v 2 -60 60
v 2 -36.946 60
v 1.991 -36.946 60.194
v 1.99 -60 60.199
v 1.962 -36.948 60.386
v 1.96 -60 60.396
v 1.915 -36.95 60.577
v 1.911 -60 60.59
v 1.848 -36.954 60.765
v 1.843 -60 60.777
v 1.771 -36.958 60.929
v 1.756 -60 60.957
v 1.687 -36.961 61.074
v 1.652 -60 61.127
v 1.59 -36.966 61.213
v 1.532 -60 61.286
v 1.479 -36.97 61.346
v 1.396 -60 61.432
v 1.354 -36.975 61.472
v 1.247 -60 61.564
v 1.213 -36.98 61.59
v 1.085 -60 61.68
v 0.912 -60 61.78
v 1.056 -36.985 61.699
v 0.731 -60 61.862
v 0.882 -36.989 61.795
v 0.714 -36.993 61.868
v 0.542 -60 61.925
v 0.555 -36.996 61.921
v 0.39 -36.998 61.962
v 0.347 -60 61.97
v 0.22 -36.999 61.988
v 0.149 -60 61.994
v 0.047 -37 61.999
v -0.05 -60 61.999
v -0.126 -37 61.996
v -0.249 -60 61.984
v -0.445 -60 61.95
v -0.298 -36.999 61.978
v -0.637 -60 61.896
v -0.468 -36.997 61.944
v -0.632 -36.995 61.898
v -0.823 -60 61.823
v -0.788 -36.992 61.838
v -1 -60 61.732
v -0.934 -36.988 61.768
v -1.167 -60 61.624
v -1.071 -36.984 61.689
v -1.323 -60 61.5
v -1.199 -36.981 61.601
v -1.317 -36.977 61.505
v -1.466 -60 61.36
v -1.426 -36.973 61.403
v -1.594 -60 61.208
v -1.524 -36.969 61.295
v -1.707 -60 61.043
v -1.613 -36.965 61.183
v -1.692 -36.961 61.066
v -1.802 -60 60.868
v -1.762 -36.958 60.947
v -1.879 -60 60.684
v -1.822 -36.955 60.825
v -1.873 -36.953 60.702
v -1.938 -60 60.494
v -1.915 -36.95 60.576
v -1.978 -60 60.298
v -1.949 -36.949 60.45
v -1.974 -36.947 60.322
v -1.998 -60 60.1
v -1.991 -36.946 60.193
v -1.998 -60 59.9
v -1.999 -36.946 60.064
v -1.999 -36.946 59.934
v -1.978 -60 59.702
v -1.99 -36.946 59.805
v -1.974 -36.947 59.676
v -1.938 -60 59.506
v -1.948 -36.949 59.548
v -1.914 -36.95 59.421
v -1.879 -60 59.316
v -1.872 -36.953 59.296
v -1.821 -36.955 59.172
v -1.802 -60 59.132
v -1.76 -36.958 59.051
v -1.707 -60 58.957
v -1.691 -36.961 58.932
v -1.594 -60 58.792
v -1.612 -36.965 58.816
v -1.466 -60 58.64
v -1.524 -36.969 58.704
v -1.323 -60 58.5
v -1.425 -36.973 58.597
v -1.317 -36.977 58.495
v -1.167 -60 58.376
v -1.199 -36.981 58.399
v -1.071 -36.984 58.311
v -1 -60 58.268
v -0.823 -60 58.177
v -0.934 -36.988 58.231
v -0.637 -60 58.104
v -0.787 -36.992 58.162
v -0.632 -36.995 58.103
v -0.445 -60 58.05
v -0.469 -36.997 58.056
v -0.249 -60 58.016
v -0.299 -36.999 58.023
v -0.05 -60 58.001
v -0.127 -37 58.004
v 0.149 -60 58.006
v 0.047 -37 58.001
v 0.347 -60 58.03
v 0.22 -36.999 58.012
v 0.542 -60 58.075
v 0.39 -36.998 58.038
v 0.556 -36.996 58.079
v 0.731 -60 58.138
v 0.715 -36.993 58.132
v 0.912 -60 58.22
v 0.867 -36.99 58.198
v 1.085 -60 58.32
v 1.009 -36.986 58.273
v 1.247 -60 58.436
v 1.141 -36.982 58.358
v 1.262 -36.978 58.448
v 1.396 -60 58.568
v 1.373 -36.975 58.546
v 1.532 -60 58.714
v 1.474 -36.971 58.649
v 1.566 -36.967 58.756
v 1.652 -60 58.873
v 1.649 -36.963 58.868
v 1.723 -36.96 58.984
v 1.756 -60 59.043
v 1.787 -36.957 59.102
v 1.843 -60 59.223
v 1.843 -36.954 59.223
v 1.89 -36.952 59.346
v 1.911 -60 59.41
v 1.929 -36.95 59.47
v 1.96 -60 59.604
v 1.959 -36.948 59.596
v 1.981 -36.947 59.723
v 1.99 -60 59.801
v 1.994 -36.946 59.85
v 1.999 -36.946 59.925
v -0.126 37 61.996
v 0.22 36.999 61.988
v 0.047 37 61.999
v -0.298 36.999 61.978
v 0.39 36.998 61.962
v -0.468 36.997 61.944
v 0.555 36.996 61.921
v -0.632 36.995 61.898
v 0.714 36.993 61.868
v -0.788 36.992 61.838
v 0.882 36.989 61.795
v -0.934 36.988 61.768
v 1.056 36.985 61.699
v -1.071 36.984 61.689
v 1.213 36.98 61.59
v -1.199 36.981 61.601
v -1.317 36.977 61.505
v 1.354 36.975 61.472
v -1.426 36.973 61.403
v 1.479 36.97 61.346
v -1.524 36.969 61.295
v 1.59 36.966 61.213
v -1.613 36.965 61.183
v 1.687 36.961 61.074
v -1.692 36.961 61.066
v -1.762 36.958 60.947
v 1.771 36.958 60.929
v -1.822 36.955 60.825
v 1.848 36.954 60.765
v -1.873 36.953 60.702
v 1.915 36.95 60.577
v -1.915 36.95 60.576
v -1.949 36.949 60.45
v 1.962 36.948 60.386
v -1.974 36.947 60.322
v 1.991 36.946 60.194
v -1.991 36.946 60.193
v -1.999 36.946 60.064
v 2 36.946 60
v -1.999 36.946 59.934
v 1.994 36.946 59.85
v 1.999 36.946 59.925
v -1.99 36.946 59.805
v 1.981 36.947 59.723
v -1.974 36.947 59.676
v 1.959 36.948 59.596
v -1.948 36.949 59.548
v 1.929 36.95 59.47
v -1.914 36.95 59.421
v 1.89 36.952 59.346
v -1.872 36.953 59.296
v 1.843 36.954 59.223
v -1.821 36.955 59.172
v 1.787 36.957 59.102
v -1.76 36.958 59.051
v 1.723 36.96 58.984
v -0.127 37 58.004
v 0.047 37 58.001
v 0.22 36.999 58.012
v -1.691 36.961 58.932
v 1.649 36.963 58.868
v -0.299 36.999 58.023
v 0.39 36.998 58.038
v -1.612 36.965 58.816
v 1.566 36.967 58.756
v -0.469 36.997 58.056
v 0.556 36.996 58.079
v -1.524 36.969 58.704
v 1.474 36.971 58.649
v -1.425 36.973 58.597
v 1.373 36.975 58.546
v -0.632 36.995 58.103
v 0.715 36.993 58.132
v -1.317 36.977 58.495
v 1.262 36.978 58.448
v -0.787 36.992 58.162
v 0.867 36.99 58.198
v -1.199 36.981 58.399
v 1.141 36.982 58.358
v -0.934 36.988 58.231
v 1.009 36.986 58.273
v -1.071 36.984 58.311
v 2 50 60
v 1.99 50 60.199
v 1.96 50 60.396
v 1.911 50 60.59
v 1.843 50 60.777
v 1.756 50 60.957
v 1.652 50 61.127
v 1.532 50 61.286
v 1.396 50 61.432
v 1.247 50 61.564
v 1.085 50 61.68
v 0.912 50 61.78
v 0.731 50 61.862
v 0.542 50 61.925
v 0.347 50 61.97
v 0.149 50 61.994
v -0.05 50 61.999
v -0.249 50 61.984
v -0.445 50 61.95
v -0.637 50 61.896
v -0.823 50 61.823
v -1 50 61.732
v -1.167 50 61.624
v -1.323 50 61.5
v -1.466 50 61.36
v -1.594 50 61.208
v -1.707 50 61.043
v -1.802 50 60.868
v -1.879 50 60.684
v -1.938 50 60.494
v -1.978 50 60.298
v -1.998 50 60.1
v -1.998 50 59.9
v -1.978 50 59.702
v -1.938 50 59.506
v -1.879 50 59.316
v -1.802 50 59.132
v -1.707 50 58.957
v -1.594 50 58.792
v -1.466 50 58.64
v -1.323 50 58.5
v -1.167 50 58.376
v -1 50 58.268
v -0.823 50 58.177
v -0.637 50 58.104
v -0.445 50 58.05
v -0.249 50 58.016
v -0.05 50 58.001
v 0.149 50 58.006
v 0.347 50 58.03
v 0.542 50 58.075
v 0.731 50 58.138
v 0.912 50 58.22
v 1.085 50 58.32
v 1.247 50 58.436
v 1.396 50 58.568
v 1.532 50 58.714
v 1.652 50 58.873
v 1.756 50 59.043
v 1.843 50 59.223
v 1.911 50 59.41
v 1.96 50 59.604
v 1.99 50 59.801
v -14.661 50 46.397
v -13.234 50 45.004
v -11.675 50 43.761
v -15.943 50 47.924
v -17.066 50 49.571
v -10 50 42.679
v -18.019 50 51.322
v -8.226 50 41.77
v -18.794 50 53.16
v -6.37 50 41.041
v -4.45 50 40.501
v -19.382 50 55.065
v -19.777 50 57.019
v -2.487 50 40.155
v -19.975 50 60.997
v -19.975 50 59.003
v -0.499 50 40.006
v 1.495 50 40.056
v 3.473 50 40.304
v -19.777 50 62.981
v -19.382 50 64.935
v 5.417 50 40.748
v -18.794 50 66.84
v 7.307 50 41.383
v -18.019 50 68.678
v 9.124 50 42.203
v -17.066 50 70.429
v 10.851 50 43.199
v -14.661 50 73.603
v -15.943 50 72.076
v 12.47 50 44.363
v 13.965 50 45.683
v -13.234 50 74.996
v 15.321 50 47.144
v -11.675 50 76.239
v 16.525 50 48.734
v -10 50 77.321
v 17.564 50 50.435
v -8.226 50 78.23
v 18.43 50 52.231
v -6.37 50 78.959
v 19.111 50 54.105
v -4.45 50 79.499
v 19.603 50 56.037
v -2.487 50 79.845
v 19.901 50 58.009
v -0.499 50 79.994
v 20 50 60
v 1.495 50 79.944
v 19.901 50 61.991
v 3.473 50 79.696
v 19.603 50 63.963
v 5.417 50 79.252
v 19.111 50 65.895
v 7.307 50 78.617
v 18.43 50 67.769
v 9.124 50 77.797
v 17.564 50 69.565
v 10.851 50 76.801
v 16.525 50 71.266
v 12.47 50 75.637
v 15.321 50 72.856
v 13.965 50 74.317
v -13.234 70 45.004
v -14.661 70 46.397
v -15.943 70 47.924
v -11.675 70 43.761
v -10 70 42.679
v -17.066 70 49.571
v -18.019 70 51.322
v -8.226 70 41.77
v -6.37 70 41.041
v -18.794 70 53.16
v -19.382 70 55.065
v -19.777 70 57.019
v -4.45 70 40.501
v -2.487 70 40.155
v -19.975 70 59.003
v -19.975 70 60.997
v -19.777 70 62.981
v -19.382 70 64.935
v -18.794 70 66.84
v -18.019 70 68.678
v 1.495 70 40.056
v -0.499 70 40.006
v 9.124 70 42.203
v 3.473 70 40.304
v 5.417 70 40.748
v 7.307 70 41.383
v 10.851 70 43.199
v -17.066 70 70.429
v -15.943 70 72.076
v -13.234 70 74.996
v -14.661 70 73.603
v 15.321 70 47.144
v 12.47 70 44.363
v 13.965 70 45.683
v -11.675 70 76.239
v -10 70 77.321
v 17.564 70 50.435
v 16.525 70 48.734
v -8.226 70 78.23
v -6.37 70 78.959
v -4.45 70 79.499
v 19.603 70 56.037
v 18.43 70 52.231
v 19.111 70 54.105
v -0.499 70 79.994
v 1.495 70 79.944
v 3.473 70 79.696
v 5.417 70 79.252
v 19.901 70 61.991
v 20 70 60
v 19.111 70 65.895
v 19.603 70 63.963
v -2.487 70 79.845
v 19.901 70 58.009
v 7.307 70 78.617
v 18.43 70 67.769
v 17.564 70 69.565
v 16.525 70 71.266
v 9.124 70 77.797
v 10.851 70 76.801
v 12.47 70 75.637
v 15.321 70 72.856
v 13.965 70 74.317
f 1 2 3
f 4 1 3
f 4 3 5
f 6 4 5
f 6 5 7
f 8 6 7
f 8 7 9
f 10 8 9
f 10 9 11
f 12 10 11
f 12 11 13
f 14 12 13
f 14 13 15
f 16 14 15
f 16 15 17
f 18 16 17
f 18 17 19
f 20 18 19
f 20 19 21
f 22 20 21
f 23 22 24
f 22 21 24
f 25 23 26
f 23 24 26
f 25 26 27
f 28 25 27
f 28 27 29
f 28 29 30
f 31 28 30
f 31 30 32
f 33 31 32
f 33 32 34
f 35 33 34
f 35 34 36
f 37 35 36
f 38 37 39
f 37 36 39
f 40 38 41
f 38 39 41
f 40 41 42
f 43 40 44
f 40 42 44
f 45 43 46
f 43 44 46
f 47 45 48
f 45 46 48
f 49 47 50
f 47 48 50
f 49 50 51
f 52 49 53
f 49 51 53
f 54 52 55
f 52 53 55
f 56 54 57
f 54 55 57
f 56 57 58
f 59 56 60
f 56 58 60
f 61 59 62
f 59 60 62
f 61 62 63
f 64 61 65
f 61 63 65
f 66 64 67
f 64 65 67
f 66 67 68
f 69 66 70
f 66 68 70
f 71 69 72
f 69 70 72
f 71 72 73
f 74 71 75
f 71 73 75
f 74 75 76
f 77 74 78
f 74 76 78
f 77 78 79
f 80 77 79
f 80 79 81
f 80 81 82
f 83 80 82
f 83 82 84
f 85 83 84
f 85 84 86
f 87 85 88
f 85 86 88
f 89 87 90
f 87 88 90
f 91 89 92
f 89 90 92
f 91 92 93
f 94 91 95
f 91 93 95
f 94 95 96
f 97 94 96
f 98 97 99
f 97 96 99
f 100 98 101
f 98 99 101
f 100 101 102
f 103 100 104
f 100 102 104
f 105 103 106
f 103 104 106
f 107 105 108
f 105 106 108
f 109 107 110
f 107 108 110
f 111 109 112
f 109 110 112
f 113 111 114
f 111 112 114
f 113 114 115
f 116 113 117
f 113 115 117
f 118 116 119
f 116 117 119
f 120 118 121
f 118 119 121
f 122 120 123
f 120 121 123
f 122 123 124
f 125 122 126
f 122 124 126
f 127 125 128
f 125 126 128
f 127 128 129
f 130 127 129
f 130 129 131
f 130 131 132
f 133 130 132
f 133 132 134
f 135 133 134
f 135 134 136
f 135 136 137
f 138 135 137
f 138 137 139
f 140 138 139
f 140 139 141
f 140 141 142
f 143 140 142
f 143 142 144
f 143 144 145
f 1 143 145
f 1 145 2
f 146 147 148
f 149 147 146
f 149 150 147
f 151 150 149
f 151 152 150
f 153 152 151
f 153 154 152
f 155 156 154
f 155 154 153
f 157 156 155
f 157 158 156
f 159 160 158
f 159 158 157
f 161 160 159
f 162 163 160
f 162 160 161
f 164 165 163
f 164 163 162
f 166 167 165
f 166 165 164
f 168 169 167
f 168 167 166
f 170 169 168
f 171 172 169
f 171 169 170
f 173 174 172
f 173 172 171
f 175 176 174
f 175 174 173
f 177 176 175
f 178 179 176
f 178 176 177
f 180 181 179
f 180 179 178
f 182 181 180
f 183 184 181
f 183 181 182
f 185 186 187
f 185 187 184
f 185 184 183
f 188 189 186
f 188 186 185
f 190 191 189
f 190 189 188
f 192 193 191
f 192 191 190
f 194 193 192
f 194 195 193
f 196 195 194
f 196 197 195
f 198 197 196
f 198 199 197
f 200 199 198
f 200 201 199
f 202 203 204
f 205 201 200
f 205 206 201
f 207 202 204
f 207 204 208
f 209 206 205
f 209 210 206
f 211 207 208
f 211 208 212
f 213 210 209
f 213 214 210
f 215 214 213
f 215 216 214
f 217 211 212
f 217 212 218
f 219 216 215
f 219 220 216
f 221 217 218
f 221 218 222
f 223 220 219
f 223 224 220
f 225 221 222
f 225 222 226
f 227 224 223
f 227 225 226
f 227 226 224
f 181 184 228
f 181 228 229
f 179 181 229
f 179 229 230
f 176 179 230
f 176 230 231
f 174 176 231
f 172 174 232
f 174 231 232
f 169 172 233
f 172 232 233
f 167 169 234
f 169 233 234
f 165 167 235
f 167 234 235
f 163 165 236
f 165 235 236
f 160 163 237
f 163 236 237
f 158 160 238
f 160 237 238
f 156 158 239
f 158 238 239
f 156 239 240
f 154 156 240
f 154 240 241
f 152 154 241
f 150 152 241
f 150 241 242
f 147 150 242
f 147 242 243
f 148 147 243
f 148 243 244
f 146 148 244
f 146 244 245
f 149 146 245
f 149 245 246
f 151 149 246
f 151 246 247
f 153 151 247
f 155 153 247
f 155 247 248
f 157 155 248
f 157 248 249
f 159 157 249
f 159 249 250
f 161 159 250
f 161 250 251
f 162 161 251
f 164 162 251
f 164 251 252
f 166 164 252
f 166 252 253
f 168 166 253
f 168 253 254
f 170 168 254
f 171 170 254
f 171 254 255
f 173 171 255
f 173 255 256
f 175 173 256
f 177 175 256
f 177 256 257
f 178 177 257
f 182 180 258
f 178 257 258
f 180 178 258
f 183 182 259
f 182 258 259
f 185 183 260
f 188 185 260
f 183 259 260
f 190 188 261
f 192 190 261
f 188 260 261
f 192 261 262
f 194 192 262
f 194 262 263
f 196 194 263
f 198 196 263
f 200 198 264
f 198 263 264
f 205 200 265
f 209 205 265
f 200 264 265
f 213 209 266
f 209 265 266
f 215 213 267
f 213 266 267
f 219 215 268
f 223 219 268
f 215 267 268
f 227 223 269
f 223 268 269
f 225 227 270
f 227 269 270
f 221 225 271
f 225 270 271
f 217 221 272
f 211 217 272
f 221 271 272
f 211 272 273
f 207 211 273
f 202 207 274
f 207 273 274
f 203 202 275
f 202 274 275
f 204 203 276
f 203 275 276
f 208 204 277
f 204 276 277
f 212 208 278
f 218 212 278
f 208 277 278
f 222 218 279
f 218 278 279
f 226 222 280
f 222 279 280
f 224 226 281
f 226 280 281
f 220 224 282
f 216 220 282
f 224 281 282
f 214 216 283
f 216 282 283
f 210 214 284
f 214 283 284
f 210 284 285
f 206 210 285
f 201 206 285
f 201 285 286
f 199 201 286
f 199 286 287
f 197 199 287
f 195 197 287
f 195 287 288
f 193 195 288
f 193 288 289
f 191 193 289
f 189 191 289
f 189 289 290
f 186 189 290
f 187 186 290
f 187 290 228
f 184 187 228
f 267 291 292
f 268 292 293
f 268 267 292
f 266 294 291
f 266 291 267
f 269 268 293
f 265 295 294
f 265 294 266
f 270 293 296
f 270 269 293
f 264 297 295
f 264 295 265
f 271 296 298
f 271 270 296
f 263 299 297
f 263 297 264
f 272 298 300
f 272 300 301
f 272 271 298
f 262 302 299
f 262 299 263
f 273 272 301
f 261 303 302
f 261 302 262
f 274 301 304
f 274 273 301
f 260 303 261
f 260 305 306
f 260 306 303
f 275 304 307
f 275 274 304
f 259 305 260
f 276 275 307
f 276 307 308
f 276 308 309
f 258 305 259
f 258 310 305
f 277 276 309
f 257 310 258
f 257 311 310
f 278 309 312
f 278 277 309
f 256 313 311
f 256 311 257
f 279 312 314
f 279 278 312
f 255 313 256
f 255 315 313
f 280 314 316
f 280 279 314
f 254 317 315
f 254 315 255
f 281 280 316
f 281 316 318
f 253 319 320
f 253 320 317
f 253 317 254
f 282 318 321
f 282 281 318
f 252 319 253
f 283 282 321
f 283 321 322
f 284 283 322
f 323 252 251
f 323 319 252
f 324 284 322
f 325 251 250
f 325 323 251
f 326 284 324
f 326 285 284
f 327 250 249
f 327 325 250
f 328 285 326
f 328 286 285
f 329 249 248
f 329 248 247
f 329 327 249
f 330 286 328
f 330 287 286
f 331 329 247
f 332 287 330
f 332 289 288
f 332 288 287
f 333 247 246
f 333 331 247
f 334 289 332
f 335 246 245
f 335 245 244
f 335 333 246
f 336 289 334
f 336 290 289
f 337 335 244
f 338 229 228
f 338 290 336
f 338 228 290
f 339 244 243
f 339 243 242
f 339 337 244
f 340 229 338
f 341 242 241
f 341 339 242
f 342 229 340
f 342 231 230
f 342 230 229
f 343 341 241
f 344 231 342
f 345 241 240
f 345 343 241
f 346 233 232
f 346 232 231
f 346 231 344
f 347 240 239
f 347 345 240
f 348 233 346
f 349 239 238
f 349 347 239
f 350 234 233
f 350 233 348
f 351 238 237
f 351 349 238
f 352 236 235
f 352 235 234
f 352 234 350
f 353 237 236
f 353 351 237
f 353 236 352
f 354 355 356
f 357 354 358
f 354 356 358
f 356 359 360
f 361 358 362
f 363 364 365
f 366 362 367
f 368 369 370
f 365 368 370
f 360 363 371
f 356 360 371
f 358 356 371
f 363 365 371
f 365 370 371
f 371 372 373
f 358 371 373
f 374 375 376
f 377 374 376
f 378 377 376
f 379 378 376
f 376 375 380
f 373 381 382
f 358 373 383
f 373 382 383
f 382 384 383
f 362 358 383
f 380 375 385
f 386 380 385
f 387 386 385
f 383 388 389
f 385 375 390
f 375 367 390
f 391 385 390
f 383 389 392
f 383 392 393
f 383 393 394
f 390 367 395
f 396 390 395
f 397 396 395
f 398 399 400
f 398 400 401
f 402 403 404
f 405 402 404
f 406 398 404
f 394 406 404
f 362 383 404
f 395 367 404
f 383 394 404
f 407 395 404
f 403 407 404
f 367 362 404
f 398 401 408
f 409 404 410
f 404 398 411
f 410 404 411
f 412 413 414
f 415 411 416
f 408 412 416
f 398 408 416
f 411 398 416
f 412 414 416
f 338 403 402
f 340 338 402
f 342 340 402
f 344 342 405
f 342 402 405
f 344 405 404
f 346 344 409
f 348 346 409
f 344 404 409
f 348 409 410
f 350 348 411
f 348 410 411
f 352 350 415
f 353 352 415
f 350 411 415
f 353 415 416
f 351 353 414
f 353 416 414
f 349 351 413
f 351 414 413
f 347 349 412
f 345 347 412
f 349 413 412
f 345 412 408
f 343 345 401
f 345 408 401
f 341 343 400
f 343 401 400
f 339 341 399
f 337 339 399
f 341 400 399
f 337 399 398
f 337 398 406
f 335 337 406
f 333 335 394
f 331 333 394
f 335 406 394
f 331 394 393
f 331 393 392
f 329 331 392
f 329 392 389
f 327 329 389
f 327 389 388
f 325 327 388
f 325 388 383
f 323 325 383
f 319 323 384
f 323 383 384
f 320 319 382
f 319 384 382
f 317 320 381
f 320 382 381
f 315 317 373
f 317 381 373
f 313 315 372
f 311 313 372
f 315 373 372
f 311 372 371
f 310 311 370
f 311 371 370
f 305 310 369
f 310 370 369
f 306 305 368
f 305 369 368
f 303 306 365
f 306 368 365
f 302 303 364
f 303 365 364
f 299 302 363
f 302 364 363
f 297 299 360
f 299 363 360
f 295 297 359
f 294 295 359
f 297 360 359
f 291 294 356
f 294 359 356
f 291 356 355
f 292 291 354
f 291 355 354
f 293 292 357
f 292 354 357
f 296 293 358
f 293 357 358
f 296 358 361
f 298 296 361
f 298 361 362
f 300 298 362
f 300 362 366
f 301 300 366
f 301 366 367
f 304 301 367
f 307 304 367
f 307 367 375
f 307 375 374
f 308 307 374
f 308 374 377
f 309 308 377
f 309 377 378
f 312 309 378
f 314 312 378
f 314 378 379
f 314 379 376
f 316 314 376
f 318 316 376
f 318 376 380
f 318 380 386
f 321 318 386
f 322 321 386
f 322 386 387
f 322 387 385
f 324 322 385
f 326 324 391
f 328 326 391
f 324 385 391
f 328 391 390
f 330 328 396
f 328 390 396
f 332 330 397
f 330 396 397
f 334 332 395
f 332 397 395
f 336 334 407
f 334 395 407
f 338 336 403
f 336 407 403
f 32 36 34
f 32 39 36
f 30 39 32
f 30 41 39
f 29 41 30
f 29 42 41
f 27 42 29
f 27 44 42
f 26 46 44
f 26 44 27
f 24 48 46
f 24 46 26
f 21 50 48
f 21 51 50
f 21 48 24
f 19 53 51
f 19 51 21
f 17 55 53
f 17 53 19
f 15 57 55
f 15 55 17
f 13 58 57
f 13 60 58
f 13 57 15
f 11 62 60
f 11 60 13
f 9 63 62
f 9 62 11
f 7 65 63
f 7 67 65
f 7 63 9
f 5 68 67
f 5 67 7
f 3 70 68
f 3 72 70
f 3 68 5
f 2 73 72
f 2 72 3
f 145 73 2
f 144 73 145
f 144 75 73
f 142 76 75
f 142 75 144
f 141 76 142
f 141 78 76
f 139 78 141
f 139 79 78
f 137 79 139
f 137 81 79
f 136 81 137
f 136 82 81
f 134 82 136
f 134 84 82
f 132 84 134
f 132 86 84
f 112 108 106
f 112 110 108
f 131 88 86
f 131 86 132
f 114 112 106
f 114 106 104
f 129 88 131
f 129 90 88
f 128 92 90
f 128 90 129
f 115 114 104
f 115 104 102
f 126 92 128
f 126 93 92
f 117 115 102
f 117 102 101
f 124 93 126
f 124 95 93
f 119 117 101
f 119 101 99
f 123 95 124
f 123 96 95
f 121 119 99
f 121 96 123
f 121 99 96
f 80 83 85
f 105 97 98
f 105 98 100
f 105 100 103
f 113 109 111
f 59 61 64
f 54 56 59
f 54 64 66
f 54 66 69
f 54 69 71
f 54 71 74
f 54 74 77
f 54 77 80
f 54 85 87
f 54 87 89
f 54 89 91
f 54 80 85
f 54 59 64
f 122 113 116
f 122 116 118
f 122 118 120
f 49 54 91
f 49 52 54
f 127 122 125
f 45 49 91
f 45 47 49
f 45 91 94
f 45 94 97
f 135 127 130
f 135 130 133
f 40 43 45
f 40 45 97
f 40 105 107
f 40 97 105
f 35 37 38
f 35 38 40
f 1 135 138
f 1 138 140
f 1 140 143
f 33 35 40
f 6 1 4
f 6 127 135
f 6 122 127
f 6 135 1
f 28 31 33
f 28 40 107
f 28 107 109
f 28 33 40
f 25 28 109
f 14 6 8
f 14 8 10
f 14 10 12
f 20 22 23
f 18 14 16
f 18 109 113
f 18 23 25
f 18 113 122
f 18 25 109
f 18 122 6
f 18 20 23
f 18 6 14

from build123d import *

# Parameters (mm, degrees)
CYLINDER004_R     = 37
CYLINDER004_DEPTH = 30
CYLINDER003_R     = 2
CYLINDER003_DEPTH = 120
CYLINDER005_R     = 20
CYLINDER005_DEPTH = 20


with BuildPart() as cylinder004:
    # Cylinder004 → Cylinder004 (new body)
    with BuildSketch(Plane.XY.offset(56)):
        Circle(CYLINDER004_R)
    extrude(amount=CYLINDER004_DEPTH)


with BuildPart() as cut001:
    # Cylinder003 → Cylinder003 (new body)
    with BuildSketch(Plane(origin=(0, 60, 60), x_dir=(1, 0, 0), z_dir=(0, -1, 0))):
        Circle(CYLINDER003_R)
    extrude(amount=CYLINDER003_DEPTH)

    # Cut001: cut Cylinder004
    add(cylinder004.part, mode=Mode.SUBTRACT)


with BuildPart() as eje:
    # Cylinder005 → Cylinder005 (new body)
    with BuildSketch(Plane(origin=(0, 70, 60), x_dir=(1, 0, 0), z_dir=(0, -1, 0))):
        Circle(CYLINDER005_R)
    extrude(amount=CYLINDER005_DEPTH)

    # Fusion: union Cut001
    add(cut001.part)


solid = eje.part
